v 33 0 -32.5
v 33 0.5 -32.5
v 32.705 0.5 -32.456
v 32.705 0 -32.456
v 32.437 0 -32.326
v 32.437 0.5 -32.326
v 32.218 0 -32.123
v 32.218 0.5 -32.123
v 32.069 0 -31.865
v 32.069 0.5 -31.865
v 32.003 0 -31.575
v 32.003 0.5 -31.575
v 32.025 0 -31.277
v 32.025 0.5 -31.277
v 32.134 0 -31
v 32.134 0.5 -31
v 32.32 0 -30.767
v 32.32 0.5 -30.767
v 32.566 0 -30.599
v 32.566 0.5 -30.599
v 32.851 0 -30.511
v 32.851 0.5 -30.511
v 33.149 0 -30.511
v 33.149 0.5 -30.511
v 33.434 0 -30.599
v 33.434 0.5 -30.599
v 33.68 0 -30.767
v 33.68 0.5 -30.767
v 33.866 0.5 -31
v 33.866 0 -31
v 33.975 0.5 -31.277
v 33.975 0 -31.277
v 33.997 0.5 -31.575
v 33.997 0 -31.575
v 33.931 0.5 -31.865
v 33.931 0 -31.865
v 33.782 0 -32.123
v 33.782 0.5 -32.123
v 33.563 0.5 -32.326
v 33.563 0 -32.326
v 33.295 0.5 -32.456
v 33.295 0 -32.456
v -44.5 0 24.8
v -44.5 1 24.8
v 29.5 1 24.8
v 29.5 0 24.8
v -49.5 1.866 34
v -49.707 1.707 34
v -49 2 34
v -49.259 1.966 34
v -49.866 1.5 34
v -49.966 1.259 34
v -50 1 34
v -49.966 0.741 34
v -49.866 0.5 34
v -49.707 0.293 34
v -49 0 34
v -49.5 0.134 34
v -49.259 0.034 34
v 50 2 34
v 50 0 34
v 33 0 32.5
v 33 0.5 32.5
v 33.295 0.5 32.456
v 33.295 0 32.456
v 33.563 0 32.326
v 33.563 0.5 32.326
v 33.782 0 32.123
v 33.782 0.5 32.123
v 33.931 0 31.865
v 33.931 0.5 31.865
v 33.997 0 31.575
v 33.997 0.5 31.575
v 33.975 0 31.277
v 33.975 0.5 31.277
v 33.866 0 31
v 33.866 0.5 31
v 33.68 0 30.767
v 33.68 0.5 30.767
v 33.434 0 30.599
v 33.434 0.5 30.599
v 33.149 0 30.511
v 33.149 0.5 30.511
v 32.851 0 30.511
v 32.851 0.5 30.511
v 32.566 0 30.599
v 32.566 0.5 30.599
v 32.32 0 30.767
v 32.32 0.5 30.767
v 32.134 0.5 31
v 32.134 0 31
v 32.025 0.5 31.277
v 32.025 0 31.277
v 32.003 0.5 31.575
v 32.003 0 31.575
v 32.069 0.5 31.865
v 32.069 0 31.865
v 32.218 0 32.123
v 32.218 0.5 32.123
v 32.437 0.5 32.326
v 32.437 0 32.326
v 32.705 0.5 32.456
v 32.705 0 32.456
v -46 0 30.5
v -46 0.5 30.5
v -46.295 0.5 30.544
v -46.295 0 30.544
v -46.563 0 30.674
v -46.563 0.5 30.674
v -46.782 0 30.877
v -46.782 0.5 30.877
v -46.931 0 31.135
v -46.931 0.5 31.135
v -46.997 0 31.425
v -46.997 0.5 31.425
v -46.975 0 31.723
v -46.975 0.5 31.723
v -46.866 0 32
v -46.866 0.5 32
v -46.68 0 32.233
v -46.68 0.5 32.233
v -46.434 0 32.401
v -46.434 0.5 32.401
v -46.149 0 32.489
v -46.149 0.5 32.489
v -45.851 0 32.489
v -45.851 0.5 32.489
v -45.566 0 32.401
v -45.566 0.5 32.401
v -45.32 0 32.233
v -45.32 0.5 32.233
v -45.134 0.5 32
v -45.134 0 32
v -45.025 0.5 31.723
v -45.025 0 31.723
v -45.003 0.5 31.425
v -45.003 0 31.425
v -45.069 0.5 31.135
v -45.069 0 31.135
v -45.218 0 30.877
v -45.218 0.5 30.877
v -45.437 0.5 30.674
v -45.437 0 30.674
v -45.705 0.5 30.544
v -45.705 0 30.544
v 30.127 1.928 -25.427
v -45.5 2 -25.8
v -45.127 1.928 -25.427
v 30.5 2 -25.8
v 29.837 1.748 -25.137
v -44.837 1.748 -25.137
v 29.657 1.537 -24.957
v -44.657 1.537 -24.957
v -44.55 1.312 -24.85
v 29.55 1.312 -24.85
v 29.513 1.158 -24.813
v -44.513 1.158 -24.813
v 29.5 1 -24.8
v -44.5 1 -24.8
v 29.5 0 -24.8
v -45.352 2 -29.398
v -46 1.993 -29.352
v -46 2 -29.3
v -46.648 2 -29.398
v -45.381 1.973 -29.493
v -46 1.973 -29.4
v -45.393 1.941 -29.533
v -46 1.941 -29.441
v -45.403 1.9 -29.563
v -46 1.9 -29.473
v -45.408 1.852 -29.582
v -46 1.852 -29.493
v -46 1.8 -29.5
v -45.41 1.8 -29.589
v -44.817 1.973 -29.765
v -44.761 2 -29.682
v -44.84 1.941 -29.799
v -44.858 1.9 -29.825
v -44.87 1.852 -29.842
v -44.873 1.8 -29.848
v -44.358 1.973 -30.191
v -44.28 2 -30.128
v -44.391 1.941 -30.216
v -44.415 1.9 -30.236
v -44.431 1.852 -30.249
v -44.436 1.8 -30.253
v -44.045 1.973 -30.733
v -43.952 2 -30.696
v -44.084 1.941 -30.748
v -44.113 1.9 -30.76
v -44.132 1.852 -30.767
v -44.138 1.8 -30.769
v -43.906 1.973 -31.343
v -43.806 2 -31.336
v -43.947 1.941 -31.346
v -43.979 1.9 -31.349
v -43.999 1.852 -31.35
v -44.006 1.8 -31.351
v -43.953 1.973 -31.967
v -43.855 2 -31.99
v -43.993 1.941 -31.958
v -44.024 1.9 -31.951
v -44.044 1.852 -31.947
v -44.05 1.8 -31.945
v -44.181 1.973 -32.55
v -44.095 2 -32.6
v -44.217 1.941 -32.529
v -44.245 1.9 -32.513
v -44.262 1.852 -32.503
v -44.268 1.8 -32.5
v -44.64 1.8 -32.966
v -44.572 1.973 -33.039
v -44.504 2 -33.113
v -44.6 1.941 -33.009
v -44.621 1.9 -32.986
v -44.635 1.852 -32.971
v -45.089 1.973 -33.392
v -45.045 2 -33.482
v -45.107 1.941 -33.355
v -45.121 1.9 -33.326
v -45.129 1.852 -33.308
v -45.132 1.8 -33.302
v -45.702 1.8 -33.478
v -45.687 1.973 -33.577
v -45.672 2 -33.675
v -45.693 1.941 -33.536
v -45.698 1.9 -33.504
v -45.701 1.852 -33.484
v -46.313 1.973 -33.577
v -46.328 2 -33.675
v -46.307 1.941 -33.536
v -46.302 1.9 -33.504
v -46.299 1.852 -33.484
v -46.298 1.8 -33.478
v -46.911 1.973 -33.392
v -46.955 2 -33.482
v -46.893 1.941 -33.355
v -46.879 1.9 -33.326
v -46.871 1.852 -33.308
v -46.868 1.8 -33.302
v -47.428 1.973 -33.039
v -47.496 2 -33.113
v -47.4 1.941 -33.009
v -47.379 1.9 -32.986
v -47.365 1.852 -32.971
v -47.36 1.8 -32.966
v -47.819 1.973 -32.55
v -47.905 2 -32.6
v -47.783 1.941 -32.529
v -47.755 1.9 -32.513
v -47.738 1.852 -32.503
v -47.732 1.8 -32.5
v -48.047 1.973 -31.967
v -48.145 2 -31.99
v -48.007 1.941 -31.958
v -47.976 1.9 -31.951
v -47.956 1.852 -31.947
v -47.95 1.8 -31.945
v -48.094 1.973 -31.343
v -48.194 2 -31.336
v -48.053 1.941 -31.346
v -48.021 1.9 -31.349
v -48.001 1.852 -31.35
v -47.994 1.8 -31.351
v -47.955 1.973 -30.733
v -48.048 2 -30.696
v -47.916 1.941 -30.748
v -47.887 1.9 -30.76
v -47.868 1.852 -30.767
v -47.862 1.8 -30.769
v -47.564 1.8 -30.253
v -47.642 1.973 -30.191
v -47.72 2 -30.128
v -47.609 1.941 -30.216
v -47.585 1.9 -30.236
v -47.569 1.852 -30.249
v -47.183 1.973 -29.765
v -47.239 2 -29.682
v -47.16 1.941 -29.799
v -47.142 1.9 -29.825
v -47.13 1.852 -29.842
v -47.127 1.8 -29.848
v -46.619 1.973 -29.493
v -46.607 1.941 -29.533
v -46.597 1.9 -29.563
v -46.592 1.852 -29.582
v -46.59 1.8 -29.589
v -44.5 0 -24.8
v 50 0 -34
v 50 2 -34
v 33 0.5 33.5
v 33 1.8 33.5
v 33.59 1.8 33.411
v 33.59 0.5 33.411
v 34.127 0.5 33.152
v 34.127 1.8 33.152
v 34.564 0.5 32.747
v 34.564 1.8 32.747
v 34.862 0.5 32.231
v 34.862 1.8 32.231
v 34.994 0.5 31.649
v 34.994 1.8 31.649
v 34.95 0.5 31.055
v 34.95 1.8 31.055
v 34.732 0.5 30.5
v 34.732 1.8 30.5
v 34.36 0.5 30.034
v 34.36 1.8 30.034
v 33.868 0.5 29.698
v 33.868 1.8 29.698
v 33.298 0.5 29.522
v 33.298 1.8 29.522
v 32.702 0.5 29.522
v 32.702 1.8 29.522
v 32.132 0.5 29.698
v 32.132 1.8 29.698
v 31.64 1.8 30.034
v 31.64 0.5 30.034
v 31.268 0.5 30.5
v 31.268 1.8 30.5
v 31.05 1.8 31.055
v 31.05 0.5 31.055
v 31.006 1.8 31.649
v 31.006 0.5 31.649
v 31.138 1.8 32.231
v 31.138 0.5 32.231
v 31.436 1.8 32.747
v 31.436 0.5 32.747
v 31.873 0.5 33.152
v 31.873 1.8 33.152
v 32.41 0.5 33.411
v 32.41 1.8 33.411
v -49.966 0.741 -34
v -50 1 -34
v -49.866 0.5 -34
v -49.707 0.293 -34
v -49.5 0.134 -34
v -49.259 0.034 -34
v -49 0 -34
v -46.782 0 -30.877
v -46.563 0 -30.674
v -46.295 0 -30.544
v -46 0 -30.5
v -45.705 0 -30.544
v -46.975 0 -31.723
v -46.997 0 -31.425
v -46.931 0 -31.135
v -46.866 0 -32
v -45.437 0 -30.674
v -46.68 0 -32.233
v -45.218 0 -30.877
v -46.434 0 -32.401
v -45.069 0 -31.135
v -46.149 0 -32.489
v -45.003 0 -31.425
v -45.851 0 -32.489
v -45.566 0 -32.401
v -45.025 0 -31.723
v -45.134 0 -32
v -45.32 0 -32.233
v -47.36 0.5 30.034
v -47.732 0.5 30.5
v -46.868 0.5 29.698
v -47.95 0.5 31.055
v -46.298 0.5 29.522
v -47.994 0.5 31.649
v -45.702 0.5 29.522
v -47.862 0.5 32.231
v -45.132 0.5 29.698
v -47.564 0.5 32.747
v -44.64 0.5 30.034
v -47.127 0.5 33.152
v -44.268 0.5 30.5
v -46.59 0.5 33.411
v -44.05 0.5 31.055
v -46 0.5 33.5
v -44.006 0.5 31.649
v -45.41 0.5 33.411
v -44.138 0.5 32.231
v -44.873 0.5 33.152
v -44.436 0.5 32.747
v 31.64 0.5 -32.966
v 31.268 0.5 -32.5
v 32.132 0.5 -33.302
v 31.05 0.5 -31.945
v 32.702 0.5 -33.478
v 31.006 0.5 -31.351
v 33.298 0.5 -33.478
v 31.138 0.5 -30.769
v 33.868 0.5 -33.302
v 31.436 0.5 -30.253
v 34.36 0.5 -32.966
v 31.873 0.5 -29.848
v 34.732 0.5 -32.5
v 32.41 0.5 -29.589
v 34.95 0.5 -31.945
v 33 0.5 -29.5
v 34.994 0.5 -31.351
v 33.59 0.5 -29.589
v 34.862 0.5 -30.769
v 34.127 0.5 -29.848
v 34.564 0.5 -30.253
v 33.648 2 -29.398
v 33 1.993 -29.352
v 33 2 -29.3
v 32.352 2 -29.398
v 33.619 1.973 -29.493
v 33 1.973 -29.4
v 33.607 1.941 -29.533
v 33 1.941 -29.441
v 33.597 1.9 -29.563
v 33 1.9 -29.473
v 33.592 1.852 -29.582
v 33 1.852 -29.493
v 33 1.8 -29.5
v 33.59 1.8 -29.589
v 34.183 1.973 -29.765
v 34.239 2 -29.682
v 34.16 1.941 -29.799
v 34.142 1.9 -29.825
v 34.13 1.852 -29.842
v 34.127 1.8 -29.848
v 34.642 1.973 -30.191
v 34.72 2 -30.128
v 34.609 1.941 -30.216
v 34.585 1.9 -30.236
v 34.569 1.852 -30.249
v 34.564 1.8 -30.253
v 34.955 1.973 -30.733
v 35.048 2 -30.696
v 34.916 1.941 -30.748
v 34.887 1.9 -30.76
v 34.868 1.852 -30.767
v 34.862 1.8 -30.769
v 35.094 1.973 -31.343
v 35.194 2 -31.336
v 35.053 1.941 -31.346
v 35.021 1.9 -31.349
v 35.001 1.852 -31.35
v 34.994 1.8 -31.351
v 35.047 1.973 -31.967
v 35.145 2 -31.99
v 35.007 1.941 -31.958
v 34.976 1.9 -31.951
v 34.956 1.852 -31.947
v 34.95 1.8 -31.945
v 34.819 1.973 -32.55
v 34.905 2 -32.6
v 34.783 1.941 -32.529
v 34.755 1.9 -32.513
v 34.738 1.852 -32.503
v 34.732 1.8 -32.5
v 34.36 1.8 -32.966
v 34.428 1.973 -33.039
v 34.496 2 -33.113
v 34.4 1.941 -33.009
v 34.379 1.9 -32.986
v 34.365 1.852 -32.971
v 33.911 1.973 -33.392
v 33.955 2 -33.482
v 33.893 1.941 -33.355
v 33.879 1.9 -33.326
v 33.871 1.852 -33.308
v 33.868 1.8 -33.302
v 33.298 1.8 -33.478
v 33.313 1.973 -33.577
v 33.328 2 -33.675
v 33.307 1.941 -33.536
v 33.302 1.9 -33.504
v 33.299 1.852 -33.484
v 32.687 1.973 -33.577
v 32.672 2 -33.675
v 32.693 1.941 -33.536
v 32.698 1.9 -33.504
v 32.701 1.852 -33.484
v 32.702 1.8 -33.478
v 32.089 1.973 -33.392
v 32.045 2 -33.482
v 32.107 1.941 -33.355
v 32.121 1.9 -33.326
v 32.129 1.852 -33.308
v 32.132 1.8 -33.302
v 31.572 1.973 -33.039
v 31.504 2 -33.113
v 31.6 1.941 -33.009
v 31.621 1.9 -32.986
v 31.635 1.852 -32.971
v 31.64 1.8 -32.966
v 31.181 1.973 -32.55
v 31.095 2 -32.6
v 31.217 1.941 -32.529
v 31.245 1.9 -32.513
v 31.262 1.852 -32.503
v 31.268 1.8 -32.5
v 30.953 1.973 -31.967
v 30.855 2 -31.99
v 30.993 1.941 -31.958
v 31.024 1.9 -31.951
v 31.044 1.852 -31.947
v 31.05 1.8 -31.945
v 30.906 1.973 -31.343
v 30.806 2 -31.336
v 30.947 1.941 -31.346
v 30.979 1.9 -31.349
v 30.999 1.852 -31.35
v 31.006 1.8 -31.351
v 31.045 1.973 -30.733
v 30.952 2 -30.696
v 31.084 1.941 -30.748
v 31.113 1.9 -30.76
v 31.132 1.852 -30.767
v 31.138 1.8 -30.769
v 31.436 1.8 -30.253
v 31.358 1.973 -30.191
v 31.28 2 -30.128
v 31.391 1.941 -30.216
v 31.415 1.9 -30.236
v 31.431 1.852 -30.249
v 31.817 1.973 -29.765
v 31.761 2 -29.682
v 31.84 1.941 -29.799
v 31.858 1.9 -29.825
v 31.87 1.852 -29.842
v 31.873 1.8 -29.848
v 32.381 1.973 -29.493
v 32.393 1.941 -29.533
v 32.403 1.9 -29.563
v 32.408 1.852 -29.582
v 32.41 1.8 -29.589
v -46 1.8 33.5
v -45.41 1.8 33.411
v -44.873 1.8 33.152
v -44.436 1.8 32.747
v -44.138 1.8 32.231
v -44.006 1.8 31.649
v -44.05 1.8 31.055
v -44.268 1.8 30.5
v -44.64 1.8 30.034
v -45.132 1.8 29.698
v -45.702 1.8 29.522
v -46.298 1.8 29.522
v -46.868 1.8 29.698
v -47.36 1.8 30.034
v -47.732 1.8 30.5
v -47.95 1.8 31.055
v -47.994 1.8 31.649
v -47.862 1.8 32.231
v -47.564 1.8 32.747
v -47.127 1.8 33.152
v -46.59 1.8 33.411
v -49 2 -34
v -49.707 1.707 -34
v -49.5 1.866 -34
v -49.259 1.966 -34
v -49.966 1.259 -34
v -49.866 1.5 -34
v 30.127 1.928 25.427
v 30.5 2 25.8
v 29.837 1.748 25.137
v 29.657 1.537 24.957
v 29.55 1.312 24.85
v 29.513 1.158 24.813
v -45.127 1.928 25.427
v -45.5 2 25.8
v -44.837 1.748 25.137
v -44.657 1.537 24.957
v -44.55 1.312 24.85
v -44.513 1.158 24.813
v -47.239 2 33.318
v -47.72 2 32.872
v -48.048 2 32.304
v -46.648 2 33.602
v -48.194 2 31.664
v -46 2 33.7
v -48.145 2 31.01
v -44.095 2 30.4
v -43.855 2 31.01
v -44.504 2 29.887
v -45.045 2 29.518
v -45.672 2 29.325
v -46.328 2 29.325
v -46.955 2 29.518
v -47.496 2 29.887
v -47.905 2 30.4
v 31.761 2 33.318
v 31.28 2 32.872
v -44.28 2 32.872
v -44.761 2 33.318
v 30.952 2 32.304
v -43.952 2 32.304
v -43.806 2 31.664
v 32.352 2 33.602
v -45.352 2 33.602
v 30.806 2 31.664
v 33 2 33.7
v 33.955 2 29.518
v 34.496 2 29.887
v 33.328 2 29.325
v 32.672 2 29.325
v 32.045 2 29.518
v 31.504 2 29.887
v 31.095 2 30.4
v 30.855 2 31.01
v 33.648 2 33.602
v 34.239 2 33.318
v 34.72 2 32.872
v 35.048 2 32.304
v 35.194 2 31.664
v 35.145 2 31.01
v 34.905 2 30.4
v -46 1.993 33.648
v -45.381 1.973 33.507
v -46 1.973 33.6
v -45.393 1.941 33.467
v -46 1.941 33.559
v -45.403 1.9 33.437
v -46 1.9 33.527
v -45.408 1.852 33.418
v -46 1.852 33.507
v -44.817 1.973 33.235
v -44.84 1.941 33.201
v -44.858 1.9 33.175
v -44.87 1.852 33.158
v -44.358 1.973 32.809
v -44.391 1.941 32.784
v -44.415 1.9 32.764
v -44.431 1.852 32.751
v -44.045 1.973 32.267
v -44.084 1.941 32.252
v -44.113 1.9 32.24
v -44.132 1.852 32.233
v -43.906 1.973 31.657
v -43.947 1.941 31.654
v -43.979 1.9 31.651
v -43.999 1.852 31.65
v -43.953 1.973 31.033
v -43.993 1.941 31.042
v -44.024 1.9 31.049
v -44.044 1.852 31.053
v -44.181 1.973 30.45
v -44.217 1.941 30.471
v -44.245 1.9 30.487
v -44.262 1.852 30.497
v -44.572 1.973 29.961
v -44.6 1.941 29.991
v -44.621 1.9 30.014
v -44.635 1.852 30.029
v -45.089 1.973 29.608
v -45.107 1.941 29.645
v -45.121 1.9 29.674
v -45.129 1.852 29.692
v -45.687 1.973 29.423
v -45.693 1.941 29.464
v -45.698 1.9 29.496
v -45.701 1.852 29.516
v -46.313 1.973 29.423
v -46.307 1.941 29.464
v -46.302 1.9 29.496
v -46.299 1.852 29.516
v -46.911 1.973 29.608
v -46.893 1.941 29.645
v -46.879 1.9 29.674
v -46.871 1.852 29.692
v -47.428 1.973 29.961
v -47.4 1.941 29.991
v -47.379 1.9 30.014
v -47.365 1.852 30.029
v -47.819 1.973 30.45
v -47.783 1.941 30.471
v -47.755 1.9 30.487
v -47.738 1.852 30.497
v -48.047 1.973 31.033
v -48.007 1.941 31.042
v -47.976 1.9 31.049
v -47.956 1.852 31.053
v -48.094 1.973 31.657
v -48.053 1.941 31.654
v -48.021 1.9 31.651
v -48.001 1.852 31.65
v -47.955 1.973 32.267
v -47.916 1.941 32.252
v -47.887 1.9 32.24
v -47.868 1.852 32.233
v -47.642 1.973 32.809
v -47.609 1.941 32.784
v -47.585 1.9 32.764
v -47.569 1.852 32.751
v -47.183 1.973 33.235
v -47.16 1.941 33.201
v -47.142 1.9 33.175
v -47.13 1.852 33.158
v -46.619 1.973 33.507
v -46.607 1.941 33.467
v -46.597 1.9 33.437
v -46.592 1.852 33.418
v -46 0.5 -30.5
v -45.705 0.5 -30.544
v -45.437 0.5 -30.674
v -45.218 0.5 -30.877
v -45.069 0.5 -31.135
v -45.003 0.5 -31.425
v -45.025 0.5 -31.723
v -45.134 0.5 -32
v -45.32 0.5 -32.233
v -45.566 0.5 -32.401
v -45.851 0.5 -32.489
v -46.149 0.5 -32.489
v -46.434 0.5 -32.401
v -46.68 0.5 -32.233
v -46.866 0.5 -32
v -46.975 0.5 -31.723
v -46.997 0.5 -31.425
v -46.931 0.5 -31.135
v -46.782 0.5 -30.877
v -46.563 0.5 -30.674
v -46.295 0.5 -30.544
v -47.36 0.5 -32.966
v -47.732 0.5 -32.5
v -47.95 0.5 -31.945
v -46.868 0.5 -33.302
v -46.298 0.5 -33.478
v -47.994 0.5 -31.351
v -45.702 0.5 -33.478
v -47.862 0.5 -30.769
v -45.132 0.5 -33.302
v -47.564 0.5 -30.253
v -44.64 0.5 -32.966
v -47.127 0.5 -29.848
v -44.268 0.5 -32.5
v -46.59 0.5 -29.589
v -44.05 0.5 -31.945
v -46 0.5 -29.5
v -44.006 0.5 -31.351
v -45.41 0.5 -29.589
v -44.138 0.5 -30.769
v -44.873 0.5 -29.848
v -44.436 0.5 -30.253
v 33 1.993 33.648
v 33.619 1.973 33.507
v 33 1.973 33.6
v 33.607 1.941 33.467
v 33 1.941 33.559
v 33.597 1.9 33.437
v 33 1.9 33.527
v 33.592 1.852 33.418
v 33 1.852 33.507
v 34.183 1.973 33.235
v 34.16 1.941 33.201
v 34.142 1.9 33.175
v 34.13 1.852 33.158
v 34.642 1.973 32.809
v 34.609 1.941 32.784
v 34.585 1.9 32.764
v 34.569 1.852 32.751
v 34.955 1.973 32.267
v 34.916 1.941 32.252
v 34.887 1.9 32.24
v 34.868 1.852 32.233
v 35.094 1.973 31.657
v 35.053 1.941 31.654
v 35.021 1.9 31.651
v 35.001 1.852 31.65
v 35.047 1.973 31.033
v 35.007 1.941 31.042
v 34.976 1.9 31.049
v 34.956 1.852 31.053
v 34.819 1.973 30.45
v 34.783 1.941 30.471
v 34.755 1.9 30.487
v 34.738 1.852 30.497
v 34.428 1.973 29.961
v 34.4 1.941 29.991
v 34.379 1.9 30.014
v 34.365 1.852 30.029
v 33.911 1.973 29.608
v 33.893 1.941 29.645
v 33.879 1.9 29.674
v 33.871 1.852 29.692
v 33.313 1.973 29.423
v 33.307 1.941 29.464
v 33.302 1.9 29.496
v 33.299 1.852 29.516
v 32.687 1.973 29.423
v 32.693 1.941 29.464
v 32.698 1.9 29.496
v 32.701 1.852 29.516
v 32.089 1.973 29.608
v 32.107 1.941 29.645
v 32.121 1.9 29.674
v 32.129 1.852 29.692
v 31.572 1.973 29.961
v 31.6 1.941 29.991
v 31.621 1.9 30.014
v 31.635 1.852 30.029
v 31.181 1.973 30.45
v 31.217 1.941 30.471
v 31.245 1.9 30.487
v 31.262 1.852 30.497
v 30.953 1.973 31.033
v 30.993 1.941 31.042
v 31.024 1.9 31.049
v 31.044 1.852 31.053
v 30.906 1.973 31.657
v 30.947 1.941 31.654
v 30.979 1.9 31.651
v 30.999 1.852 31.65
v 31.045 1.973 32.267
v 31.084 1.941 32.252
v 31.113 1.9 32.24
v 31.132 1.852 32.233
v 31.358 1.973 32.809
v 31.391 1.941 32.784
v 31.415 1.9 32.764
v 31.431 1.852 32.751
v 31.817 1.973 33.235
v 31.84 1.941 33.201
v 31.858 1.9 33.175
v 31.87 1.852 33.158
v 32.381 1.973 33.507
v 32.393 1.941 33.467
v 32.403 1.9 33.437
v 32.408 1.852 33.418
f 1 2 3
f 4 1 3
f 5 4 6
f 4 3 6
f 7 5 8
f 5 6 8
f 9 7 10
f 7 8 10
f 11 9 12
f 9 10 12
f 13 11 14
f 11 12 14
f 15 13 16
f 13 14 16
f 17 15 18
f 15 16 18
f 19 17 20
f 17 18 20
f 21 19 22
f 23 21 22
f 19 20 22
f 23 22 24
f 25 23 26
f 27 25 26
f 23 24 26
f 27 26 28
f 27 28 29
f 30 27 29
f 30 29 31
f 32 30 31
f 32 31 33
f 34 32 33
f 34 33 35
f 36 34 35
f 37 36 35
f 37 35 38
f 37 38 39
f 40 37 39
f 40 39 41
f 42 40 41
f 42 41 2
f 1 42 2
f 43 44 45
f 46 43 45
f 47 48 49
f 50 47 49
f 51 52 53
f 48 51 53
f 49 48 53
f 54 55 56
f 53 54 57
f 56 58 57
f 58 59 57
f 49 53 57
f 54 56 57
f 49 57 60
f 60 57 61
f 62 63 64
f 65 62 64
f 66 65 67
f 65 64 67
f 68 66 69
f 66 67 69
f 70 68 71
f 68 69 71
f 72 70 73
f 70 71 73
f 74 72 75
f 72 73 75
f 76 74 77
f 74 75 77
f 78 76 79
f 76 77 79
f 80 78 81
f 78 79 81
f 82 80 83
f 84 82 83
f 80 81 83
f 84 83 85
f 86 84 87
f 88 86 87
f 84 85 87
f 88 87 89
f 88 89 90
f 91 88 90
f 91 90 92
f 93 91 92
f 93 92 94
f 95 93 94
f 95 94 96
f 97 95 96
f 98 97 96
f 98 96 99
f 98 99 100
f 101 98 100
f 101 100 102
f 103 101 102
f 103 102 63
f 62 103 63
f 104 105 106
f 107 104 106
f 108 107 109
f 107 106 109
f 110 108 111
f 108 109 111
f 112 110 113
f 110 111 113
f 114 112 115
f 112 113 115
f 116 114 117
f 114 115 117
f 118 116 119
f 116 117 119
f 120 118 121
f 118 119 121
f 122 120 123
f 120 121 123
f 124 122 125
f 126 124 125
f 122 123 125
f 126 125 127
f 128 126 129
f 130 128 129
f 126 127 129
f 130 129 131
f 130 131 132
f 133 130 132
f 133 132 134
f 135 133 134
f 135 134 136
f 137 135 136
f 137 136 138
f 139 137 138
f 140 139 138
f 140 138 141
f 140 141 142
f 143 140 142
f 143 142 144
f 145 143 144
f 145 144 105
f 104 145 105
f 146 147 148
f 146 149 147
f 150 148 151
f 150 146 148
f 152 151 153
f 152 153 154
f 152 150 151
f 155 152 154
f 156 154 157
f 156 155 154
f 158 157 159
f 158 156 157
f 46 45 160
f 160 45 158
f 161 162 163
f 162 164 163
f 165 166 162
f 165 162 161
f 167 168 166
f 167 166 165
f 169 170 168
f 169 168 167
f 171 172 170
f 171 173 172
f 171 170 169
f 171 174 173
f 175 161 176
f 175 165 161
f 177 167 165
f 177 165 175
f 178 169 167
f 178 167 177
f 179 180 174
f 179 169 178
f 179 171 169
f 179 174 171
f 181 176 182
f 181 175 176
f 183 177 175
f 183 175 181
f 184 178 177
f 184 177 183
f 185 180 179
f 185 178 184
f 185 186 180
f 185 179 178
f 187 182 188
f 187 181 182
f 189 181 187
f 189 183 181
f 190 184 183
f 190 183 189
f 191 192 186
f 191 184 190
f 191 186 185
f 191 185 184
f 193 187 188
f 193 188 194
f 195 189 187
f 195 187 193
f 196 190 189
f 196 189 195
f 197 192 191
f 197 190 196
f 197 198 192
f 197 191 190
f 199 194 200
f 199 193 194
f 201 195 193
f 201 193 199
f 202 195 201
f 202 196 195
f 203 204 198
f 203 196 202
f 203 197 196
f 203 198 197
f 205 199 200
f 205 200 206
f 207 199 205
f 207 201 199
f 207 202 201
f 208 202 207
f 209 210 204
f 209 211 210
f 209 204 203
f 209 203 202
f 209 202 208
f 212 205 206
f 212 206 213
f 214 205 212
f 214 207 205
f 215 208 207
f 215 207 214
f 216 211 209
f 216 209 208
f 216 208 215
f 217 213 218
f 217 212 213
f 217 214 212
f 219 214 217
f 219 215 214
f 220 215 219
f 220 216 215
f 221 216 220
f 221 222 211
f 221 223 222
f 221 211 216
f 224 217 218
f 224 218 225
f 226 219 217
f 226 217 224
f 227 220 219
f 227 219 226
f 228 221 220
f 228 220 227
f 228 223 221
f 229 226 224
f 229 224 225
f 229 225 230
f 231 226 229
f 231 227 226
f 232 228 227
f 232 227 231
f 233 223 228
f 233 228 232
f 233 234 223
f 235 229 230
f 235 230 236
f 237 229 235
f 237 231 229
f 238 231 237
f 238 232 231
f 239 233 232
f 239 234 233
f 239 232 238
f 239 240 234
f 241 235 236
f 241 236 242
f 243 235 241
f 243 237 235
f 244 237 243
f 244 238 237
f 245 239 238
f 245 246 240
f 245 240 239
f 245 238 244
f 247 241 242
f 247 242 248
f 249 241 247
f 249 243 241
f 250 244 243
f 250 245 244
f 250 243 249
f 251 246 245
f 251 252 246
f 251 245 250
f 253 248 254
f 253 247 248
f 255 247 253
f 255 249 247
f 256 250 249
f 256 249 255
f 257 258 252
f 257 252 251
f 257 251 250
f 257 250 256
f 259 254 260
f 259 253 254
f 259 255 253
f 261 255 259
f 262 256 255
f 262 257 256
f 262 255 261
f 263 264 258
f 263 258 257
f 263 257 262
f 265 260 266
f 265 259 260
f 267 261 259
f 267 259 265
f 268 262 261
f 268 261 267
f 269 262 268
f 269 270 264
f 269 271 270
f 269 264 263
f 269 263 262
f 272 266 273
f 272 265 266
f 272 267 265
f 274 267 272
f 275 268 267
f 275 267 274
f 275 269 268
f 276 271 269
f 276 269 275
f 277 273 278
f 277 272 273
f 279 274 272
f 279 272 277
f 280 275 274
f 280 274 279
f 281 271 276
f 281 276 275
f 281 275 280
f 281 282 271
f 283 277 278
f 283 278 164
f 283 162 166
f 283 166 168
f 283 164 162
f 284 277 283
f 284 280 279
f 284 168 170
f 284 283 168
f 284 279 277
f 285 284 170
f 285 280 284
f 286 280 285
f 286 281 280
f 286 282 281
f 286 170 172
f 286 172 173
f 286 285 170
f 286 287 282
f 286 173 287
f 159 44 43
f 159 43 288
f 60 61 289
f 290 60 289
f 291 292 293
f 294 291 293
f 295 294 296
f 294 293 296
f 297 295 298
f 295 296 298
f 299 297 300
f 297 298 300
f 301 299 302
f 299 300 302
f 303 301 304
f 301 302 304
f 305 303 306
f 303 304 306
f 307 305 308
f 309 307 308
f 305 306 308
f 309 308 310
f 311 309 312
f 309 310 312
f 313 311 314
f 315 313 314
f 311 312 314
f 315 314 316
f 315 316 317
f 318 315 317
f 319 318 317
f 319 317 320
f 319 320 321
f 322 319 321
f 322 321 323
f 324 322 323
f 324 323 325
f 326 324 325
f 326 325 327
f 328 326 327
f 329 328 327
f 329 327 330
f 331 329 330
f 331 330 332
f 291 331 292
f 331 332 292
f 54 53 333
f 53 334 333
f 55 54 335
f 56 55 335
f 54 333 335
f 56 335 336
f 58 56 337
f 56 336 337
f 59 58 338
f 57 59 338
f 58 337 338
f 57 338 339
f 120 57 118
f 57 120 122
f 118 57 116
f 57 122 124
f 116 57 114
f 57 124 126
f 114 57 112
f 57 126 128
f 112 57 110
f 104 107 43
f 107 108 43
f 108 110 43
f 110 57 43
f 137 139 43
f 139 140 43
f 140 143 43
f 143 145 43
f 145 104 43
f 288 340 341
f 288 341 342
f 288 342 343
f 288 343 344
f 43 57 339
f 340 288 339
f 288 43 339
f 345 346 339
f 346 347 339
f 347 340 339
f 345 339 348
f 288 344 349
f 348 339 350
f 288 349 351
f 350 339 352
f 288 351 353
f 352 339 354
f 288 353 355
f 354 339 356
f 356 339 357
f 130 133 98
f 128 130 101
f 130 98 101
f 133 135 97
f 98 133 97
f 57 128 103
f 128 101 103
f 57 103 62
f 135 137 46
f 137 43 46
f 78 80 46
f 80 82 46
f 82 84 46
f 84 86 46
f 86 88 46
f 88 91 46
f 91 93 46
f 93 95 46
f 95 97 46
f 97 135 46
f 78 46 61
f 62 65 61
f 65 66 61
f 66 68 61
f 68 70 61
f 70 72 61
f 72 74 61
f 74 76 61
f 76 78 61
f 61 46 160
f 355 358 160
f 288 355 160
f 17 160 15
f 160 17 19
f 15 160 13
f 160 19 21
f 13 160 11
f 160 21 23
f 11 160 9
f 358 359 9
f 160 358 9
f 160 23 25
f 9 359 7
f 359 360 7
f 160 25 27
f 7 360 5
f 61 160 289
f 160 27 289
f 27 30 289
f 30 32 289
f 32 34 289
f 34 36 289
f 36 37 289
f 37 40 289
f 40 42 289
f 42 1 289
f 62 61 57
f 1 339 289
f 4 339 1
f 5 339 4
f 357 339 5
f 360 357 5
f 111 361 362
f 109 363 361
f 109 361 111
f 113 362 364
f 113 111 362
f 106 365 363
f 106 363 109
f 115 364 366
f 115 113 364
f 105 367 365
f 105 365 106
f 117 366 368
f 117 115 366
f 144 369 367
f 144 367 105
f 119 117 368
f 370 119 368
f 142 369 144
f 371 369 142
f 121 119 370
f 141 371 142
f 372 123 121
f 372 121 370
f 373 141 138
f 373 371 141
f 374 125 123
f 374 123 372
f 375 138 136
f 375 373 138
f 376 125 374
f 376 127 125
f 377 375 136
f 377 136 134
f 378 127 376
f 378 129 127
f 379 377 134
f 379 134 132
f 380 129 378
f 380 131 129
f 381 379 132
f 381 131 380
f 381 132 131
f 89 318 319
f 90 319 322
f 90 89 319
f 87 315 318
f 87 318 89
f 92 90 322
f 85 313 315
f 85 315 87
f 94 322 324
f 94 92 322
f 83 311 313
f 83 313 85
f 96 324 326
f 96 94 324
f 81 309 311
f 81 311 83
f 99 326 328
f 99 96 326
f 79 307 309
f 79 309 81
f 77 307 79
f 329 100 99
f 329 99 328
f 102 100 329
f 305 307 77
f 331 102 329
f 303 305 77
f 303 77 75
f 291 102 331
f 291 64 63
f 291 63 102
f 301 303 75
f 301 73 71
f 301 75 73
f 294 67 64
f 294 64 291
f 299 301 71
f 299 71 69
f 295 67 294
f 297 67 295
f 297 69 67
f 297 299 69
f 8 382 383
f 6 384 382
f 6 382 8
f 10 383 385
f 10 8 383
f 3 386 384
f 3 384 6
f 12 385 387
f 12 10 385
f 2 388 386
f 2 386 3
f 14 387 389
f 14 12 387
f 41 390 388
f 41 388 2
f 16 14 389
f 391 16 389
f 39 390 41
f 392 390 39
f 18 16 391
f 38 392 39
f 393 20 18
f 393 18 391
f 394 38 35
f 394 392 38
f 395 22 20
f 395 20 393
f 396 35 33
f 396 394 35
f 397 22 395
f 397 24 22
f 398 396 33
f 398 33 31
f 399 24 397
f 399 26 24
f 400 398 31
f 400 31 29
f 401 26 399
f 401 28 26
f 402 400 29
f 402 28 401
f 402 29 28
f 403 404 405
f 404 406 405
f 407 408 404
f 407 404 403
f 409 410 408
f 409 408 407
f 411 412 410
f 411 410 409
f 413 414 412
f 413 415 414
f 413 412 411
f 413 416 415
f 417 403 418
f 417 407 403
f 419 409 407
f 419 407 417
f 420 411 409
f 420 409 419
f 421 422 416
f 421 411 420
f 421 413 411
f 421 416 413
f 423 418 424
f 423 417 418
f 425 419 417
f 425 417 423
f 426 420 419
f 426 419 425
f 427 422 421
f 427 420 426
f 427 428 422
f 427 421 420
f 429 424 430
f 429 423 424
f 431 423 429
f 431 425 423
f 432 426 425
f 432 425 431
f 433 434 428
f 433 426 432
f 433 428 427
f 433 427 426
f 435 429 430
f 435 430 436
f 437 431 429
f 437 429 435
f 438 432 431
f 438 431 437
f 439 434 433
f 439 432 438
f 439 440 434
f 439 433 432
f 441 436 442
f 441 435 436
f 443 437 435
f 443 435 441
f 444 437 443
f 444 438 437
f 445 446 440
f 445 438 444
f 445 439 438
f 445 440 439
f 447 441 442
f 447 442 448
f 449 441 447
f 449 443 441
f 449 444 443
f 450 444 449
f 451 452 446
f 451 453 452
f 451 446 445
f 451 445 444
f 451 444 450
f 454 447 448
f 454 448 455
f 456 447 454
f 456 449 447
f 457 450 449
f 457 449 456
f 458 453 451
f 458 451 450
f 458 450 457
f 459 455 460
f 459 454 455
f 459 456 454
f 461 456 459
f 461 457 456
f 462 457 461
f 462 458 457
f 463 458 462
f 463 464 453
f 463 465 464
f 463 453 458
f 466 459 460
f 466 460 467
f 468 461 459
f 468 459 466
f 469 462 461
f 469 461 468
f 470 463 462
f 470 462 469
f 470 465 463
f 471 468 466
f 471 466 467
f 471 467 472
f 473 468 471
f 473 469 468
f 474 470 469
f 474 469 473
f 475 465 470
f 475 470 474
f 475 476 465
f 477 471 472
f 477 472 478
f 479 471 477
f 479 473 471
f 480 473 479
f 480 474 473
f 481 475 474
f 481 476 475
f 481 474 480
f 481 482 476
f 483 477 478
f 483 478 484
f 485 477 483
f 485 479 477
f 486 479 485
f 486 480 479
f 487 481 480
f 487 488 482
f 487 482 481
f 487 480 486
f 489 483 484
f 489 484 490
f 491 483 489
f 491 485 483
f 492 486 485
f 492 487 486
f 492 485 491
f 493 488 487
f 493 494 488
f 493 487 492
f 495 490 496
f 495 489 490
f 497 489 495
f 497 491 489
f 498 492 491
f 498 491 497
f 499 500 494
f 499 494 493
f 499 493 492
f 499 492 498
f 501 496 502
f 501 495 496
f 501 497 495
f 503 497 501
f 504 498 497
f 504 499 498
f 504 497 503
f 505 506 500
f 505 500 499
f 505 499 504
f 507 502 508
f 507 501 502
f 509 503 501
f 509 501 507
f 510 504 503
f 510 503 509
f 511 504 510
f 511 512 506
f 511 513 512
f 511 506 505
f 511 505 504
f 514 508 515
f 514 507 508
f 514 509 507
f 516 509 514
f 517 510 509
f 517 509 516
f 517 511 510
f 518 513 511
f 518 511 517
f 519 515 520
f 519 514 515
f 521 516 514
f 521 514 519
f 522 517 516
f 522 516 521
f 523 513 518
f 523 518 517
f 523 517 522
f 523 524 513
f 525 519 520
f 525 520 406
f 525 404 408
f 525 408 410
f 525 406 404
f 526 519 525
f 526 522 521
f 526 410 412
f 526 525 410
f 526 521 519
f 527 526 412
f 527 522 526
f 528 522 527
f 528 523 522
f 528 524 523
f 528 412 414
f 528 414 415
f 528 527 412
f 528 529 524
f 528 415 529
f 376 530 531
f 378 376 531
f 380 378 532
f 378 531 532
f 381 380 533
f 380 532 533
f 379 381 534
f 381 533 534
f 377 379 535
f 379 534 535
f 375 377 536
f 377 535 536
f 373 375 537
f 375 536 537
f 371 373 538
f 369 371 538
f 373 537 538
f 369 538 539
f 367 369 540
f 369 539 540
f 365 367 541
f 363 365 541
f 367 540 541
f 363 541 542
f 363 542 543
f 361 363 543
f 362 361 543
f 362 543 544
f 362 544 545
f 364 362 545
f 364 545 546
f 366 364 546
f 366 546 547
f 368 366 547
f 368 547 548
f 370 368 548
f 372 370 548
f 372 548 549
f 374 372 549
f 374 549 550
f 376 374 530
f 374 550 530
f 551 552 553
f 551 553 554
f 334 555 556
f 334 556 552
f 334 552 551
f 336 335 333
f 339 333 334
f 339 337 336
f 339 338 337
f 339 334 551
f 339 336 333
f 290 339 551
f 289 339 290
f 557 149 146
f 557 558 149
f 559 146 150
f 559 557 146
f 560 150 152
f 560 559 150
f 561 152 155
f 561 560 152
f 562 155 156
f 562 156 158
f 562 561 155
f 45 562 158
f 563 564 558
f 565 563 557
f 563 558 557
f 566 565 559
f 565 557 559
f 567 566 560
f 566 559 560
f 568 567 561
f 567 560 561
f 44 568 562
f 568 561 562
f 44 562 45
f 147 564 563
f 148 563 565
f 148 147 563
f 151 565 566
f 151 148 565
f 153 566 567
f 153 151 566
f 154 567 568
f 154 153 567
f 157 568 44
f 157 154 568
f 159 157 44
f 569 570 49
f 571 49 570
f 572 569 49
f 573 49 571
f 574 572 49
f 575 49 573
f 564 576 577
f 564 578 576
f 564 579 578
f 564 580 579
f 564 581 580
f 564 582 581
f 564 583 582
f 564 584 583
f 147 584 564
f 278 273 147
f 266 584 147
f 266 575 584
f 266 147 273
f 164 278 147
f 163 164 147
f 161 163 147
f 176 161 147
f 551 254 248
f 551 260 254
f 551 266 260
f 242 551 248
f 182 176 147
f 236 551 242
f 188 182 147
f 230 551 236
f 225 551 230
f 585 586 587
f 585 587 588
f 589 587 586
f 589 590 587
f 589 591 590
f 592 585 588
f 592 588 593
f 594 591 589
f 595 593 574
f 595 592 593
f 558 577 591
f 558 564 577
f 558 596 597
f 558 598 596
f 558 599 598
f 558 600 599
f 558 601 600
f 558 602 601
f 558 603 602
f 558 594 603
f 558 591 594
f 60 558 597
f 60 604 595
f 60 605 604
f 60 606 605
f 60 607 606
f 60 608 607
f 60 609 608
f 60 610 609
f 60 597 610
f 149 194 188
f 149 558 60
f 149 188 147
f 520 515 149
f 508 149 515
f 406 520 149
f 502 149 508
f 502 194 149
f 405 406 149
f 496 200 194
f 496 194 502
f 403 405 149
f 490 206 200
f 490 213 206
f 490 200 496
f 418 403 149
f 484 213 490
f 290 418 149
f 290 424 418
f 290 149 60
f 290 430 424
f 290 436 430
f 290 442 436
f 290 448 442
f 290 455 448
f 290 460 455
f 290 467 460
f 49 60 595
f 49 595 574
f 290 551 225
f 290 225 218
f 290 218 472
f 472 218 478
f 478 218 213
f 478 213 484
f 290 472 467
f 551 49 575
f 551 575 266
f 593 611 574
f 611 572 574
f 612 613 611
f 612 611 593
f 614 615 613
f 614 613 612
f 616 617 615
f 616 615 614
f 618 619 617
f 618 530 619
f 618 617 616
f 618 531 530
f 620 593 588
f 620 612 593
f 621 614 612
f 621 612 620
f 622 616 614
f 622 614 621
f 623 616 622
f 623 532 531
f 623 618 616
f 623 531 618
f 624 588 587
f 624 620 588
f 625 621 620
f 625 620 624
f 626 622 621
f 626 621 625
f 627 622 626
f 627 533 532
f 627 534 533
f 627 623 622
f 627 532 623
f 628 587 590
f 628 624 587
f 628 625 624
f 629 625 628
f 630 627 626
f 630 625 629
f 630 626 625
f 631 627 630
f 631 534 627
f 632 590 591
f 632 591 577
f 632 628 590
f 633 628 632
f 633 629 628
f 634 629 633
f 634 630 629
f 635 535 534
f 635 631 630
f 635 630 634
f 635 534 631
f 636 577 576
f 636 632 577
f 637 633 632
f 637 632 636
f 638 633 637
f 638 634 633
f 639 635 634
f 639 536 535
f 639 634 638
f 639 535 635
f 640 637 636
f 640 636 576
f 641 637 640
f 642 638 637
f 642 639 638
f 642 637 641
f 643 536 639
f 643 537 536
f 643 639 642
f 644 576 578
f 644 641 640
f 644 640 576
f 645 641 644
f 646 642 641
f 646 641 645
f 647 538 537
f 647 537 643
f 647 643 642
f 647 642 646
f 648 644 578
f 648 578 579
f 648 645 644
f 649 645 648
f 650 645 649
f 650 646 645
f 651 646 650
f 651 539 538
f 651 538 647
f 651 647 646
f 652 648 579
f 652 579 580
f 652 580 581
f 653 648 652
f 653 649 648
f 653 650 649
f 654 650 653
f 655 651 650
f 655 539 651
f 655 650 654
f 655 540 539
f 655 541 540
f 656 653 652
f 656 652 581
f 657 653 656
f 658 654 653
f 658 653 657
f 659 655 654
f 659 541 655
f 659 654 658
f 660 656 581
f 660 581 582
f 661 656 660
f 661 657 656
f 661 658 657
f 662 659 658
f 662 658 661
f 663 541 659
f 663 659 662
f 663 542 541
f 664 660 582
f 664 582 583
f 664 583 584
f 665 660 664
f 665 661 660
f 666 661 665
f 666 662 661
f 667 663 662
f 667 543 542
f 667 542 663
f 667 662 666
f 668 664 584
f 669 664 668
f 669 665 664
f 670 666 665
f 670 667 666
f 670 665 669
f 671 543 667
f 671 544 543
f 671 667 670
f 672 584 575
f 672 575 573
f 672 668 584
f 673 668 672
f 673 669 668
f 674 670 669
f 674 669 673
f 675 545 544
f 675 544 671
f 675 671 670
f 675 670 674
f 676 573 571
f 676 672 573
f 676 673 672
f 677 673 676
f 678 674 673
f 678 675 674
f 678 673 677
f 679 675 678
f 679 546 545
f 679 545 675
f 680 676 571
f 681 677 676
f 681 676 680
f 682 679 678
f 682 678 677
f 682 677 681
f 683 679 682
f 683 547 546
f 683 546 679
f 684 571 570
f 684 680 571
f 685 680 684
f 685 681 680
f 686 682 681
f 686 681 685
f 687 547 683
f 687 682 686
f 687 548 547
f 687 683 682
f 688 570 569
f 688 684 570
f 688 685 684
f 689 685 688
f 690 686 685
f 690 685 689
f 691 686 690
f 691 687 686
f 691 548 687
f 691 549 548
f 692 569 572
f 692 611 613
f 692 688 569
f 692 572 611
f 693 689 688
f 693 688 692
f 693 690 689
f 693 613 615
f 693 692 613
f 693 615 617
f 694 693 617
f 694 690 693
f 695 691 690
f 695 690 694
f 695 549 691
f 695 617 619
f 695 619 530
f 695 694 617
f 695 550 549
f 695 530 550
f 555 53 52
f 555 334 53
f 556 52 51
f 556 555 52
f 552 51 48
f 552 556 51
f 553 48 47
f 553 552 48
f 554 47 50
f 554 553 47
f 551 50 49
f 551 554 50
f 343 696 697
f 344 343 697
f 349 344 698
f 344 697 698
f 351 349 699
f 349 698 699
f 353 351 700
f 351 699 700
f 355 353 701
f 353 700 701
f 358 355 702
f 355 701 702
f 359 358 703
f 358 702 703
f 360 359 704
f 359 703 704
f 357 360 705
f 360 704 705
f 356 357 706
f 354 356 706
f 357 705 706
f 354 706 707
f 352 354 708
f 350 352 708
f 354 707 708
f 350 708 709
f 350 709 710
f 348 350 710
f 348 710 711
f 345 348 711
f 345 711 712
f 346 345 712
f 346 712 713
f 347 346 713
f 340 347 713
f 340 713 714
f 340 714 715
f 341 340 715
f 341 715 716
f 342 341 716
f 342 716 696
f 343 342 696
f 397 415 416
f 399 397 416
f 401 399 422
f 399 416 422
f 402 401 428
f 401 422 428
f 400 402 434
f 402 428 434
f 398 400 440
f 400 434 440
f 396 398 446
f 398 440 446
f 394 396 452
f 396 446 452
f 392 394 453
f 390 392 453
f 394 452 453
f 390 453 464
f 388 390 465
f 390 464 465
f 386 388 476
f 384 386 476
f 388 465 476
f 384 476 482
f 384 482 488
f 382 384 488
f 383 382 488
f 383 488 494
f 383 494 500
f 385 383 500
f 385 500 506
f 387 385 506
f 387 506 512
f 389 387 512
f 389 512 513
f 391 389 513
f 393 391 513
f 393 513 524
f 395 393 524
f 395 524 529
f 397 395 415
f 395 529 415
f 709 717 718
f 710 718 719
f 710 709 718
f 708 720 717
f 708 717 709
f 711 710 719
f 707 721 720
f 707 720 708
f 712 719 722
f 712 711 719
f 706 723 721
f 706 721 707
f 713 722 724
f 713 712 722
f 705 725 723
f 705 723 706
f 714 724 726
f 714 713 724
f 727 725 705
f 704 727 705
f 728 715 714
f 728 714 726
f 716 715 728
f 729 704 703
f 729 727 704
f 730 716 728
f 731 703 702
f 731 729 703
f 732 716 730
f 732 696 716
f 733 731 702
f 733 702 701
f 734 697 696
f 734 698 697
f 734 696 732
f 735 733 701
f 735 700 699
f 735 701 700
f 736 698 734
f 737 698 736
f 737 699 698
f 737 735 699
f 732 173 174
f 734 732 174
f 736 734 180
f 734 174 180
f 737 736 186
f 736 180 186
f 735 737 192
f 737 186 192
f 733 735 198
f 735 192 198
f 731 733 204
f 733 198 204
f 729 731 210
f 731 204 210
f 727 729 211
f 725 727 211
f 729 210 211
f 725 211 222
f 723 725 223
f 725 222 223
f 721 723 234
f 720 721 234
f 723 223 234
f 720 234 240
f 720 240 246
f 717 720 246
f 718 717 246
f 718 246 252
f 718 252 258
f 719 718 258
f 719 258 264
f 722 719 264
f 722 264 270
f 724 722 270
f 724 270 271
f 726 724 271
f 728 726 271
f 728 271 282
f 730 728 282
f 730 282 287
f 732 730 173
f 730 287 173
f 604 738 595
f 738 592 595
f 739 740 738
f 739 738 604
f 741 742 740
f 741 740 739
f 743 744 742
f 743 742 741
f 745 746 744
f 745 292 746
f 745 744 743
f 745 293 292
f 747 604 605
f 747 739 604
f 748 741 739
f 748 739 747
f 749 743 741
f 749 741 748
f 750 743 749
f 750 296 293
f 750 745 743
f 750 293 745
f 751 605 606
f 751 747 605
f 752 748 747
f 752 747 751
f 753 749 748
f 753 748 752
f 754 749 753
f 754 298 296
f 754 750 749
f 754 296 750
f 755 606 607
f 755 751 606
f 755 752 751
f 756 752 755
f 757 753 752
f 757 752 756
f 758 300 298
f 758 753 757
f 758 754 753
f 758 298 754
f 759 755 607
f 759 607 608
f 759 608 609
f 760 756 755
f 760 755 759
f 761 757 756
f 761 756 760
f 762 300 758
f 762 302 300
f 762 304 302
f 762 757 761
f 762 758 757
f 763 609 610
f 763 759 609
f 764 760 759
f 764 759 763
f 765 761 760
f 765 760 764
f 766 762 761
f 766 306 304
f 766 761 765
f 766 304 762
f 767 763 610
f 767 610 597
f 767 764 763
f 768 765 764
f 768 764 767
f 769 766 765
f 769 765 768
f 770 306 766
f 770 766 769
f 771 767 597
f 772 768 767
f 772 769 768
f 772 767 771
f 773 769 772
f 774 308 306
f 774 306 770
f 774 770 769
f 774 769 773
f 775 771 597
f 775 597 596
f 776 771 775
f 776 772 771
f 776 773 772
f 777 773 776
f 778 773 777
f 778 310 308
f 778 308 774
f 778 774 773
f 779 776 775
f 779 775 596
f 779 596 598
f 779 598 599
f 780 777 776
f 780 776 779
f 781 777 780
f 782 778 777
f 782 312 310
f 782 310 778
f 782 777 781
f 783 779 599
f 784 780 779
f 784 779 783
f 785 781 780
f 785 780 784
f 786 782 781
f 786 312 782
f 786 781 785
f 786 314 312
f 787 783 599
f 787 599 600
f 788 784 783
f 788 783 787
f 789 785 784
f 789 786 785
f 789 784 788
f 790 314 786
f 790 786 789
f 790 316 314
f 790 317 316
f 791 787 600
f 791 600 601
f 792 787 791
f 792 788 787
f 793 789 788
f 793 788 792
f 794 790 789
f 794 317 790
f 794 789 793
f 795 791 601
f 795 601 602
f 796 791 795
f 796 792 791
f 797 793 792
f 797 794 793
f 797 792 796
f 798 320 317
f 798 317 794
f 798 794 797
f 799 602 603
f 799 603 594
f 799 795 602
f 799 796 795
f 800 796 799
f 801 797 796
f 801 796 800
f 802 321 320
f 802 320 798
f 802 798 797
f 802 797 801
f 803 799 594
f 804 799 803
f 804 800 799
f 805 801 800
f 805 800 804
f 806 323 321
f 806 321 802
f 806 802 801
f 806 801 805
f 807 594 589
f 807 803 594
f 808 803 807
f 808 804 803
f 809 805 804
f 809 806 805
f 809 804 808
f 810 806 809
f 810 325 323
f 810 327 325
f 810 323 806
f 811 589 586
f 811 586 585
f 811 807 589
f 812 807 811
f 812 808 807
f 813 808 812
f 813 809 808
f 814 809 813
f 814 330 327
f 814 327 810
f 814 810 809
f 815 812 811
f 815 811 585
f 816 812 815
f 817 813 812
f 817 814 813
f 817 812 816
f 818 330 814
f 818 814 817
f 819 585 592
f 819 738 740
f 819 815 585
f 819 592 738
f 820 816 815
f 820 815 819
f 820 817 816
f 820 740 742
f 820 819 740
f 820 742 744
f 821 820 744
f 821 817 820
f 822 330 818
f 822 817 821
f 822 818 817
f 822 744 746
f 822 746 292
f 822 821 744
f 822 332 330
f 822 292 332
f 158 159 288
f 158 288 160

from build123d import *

# Parameters (mm, degrees)
SKETCH_1_W          = 100
SKETCH_1_H          = 68
EXTRUDE_1_DEPTH     = 2
SKETCH_2_R          = 1
CUT_EXTRUDE_1_DEPTH = 2
SKETCH_3_R          = 2
CUT_EXTRUDE_2_DEPTH = 1.5
SKETCH_4_W          = 74
SKETCH_4_H          = 49.6
CUT_EXTRUDE_3_DEPTH = 5
FILLET_1_R          = 1
FILLET_2_R          = 1
FILLET_3_R          = 0.2


with BuildPart() as part:
    # Эскиз1 → Бобышка-Вытянуть1 (new body)
    with BuildSketch(Plane(origin=(0, 0, 0), x_dir=(1, 0, 0), z_dir=(0, 1, 0))):
        Rectangle(SKETCH_1_W, SKETCH_1_H)
    extrude(amount=EXTRUDE_1_DEPTH)

    # Эскиз2 → Вырез-Вытянуть1 (cut)
    with BuildSketch(Plane(origin=(0, 2, 0), x_dir=(1, 0, 0), z_dir=(0, 1, 0))):
        with Locations(Location((-46, 31.5, 0), (0, 0, 270))):
            Circle(SKETCH_2_R)
        with Locations(Location((33, 31.5, 0), (0, 0, 90))):
            Circle(SKETCH_2_R)
        with Locations(Location((33, -31.5, 0), (0, 0, 270))):
            Circle(SKETCH_2_R)
        with Locations(Location((-46, -31.5, 0), (0, 0, 90))):
            Circle(SKETCH_2_R)
    extrude(amount=-CUT_EXTRUDE_1_DEPTH, mode=Mode.SUBTRACT)

    # Эскиз3 → Вырез-Вытянуть2 (cut)
    with BuildSketch(Plane(origin=(0, 2, 0), x_dir=(1, 0, 0), z_dir=(0, 1, 0))):
        with Locations(Location((-46, 31.5, 0), (0, 0, 270))):
            Circle(SKETCH_3_R)
        with Locations(Location((-46, -31.5, 0), (0, 0, 270))):
            Circle(SKETCH_3_R)
        with Locations(Location((33, -31.5, 0), (0, 0, 270))):
            Circle(SKETCH_3_R)
        with Locations(Location((33, 31.5, 0), (0, 0, 270))):
            Circle(SKETCH_3_R)
    extrude(amount=-CUT_EXTRUDE_2_DEPTH, mode=Mode.SUBTRACT)

    # Эскиз4 → Вырез-Вытянуть3 (cut)
    with BuildSketch(Plane(origin=(0, 2, 0), x_dir=(1, 0, 0), z_dir=(0, 1, 0))):
        with Locations((-7.5, 0)):
            Rectangle(SKETCH_4_W, SKETCH_4_H)
    extrude(amount=-CUT_EXTRUDE_3_DEPTH, mode=Mode.SUBTRACT)

    # Скругление1
    fillet_1_edges = [part.edges().sort_by_distance(p)[0] for p in [
        (-7.5, 2, -24.8),
        (-50, 2, 0),
        (-50, 0, 0),
    ]]
    fillet(fillet_1_edges, radius=FILLET_1_R - 0.0001)  # a hair under: the kernel refuses the full size

    # Скругление2
    fillet_2_edges = [part.edges().sort_by_distance(p)[0] for p in [
        (-44.5, 2, -0.49995),
        (-7.5, 2, 24.8),
        (29.5, 2, -0.49995),
    ]]
    fillet(fillet_2_edges, radius=FILLET_2_R - 0.0001)  # a hair under: the kernel refuses the full size

    # Скругление3
    fillet_3_edges = [part.edges().sort_by_distance(p)[0] for p in [
        (-46, 2, -33.5),
        (-46, 2, 29.5),
        (33, 2, 29.5),
        (33, 2, -33.5),
    ]]
    fillet(fillet_3_edges, radius=FILLET_3_R)


solid = part.part
